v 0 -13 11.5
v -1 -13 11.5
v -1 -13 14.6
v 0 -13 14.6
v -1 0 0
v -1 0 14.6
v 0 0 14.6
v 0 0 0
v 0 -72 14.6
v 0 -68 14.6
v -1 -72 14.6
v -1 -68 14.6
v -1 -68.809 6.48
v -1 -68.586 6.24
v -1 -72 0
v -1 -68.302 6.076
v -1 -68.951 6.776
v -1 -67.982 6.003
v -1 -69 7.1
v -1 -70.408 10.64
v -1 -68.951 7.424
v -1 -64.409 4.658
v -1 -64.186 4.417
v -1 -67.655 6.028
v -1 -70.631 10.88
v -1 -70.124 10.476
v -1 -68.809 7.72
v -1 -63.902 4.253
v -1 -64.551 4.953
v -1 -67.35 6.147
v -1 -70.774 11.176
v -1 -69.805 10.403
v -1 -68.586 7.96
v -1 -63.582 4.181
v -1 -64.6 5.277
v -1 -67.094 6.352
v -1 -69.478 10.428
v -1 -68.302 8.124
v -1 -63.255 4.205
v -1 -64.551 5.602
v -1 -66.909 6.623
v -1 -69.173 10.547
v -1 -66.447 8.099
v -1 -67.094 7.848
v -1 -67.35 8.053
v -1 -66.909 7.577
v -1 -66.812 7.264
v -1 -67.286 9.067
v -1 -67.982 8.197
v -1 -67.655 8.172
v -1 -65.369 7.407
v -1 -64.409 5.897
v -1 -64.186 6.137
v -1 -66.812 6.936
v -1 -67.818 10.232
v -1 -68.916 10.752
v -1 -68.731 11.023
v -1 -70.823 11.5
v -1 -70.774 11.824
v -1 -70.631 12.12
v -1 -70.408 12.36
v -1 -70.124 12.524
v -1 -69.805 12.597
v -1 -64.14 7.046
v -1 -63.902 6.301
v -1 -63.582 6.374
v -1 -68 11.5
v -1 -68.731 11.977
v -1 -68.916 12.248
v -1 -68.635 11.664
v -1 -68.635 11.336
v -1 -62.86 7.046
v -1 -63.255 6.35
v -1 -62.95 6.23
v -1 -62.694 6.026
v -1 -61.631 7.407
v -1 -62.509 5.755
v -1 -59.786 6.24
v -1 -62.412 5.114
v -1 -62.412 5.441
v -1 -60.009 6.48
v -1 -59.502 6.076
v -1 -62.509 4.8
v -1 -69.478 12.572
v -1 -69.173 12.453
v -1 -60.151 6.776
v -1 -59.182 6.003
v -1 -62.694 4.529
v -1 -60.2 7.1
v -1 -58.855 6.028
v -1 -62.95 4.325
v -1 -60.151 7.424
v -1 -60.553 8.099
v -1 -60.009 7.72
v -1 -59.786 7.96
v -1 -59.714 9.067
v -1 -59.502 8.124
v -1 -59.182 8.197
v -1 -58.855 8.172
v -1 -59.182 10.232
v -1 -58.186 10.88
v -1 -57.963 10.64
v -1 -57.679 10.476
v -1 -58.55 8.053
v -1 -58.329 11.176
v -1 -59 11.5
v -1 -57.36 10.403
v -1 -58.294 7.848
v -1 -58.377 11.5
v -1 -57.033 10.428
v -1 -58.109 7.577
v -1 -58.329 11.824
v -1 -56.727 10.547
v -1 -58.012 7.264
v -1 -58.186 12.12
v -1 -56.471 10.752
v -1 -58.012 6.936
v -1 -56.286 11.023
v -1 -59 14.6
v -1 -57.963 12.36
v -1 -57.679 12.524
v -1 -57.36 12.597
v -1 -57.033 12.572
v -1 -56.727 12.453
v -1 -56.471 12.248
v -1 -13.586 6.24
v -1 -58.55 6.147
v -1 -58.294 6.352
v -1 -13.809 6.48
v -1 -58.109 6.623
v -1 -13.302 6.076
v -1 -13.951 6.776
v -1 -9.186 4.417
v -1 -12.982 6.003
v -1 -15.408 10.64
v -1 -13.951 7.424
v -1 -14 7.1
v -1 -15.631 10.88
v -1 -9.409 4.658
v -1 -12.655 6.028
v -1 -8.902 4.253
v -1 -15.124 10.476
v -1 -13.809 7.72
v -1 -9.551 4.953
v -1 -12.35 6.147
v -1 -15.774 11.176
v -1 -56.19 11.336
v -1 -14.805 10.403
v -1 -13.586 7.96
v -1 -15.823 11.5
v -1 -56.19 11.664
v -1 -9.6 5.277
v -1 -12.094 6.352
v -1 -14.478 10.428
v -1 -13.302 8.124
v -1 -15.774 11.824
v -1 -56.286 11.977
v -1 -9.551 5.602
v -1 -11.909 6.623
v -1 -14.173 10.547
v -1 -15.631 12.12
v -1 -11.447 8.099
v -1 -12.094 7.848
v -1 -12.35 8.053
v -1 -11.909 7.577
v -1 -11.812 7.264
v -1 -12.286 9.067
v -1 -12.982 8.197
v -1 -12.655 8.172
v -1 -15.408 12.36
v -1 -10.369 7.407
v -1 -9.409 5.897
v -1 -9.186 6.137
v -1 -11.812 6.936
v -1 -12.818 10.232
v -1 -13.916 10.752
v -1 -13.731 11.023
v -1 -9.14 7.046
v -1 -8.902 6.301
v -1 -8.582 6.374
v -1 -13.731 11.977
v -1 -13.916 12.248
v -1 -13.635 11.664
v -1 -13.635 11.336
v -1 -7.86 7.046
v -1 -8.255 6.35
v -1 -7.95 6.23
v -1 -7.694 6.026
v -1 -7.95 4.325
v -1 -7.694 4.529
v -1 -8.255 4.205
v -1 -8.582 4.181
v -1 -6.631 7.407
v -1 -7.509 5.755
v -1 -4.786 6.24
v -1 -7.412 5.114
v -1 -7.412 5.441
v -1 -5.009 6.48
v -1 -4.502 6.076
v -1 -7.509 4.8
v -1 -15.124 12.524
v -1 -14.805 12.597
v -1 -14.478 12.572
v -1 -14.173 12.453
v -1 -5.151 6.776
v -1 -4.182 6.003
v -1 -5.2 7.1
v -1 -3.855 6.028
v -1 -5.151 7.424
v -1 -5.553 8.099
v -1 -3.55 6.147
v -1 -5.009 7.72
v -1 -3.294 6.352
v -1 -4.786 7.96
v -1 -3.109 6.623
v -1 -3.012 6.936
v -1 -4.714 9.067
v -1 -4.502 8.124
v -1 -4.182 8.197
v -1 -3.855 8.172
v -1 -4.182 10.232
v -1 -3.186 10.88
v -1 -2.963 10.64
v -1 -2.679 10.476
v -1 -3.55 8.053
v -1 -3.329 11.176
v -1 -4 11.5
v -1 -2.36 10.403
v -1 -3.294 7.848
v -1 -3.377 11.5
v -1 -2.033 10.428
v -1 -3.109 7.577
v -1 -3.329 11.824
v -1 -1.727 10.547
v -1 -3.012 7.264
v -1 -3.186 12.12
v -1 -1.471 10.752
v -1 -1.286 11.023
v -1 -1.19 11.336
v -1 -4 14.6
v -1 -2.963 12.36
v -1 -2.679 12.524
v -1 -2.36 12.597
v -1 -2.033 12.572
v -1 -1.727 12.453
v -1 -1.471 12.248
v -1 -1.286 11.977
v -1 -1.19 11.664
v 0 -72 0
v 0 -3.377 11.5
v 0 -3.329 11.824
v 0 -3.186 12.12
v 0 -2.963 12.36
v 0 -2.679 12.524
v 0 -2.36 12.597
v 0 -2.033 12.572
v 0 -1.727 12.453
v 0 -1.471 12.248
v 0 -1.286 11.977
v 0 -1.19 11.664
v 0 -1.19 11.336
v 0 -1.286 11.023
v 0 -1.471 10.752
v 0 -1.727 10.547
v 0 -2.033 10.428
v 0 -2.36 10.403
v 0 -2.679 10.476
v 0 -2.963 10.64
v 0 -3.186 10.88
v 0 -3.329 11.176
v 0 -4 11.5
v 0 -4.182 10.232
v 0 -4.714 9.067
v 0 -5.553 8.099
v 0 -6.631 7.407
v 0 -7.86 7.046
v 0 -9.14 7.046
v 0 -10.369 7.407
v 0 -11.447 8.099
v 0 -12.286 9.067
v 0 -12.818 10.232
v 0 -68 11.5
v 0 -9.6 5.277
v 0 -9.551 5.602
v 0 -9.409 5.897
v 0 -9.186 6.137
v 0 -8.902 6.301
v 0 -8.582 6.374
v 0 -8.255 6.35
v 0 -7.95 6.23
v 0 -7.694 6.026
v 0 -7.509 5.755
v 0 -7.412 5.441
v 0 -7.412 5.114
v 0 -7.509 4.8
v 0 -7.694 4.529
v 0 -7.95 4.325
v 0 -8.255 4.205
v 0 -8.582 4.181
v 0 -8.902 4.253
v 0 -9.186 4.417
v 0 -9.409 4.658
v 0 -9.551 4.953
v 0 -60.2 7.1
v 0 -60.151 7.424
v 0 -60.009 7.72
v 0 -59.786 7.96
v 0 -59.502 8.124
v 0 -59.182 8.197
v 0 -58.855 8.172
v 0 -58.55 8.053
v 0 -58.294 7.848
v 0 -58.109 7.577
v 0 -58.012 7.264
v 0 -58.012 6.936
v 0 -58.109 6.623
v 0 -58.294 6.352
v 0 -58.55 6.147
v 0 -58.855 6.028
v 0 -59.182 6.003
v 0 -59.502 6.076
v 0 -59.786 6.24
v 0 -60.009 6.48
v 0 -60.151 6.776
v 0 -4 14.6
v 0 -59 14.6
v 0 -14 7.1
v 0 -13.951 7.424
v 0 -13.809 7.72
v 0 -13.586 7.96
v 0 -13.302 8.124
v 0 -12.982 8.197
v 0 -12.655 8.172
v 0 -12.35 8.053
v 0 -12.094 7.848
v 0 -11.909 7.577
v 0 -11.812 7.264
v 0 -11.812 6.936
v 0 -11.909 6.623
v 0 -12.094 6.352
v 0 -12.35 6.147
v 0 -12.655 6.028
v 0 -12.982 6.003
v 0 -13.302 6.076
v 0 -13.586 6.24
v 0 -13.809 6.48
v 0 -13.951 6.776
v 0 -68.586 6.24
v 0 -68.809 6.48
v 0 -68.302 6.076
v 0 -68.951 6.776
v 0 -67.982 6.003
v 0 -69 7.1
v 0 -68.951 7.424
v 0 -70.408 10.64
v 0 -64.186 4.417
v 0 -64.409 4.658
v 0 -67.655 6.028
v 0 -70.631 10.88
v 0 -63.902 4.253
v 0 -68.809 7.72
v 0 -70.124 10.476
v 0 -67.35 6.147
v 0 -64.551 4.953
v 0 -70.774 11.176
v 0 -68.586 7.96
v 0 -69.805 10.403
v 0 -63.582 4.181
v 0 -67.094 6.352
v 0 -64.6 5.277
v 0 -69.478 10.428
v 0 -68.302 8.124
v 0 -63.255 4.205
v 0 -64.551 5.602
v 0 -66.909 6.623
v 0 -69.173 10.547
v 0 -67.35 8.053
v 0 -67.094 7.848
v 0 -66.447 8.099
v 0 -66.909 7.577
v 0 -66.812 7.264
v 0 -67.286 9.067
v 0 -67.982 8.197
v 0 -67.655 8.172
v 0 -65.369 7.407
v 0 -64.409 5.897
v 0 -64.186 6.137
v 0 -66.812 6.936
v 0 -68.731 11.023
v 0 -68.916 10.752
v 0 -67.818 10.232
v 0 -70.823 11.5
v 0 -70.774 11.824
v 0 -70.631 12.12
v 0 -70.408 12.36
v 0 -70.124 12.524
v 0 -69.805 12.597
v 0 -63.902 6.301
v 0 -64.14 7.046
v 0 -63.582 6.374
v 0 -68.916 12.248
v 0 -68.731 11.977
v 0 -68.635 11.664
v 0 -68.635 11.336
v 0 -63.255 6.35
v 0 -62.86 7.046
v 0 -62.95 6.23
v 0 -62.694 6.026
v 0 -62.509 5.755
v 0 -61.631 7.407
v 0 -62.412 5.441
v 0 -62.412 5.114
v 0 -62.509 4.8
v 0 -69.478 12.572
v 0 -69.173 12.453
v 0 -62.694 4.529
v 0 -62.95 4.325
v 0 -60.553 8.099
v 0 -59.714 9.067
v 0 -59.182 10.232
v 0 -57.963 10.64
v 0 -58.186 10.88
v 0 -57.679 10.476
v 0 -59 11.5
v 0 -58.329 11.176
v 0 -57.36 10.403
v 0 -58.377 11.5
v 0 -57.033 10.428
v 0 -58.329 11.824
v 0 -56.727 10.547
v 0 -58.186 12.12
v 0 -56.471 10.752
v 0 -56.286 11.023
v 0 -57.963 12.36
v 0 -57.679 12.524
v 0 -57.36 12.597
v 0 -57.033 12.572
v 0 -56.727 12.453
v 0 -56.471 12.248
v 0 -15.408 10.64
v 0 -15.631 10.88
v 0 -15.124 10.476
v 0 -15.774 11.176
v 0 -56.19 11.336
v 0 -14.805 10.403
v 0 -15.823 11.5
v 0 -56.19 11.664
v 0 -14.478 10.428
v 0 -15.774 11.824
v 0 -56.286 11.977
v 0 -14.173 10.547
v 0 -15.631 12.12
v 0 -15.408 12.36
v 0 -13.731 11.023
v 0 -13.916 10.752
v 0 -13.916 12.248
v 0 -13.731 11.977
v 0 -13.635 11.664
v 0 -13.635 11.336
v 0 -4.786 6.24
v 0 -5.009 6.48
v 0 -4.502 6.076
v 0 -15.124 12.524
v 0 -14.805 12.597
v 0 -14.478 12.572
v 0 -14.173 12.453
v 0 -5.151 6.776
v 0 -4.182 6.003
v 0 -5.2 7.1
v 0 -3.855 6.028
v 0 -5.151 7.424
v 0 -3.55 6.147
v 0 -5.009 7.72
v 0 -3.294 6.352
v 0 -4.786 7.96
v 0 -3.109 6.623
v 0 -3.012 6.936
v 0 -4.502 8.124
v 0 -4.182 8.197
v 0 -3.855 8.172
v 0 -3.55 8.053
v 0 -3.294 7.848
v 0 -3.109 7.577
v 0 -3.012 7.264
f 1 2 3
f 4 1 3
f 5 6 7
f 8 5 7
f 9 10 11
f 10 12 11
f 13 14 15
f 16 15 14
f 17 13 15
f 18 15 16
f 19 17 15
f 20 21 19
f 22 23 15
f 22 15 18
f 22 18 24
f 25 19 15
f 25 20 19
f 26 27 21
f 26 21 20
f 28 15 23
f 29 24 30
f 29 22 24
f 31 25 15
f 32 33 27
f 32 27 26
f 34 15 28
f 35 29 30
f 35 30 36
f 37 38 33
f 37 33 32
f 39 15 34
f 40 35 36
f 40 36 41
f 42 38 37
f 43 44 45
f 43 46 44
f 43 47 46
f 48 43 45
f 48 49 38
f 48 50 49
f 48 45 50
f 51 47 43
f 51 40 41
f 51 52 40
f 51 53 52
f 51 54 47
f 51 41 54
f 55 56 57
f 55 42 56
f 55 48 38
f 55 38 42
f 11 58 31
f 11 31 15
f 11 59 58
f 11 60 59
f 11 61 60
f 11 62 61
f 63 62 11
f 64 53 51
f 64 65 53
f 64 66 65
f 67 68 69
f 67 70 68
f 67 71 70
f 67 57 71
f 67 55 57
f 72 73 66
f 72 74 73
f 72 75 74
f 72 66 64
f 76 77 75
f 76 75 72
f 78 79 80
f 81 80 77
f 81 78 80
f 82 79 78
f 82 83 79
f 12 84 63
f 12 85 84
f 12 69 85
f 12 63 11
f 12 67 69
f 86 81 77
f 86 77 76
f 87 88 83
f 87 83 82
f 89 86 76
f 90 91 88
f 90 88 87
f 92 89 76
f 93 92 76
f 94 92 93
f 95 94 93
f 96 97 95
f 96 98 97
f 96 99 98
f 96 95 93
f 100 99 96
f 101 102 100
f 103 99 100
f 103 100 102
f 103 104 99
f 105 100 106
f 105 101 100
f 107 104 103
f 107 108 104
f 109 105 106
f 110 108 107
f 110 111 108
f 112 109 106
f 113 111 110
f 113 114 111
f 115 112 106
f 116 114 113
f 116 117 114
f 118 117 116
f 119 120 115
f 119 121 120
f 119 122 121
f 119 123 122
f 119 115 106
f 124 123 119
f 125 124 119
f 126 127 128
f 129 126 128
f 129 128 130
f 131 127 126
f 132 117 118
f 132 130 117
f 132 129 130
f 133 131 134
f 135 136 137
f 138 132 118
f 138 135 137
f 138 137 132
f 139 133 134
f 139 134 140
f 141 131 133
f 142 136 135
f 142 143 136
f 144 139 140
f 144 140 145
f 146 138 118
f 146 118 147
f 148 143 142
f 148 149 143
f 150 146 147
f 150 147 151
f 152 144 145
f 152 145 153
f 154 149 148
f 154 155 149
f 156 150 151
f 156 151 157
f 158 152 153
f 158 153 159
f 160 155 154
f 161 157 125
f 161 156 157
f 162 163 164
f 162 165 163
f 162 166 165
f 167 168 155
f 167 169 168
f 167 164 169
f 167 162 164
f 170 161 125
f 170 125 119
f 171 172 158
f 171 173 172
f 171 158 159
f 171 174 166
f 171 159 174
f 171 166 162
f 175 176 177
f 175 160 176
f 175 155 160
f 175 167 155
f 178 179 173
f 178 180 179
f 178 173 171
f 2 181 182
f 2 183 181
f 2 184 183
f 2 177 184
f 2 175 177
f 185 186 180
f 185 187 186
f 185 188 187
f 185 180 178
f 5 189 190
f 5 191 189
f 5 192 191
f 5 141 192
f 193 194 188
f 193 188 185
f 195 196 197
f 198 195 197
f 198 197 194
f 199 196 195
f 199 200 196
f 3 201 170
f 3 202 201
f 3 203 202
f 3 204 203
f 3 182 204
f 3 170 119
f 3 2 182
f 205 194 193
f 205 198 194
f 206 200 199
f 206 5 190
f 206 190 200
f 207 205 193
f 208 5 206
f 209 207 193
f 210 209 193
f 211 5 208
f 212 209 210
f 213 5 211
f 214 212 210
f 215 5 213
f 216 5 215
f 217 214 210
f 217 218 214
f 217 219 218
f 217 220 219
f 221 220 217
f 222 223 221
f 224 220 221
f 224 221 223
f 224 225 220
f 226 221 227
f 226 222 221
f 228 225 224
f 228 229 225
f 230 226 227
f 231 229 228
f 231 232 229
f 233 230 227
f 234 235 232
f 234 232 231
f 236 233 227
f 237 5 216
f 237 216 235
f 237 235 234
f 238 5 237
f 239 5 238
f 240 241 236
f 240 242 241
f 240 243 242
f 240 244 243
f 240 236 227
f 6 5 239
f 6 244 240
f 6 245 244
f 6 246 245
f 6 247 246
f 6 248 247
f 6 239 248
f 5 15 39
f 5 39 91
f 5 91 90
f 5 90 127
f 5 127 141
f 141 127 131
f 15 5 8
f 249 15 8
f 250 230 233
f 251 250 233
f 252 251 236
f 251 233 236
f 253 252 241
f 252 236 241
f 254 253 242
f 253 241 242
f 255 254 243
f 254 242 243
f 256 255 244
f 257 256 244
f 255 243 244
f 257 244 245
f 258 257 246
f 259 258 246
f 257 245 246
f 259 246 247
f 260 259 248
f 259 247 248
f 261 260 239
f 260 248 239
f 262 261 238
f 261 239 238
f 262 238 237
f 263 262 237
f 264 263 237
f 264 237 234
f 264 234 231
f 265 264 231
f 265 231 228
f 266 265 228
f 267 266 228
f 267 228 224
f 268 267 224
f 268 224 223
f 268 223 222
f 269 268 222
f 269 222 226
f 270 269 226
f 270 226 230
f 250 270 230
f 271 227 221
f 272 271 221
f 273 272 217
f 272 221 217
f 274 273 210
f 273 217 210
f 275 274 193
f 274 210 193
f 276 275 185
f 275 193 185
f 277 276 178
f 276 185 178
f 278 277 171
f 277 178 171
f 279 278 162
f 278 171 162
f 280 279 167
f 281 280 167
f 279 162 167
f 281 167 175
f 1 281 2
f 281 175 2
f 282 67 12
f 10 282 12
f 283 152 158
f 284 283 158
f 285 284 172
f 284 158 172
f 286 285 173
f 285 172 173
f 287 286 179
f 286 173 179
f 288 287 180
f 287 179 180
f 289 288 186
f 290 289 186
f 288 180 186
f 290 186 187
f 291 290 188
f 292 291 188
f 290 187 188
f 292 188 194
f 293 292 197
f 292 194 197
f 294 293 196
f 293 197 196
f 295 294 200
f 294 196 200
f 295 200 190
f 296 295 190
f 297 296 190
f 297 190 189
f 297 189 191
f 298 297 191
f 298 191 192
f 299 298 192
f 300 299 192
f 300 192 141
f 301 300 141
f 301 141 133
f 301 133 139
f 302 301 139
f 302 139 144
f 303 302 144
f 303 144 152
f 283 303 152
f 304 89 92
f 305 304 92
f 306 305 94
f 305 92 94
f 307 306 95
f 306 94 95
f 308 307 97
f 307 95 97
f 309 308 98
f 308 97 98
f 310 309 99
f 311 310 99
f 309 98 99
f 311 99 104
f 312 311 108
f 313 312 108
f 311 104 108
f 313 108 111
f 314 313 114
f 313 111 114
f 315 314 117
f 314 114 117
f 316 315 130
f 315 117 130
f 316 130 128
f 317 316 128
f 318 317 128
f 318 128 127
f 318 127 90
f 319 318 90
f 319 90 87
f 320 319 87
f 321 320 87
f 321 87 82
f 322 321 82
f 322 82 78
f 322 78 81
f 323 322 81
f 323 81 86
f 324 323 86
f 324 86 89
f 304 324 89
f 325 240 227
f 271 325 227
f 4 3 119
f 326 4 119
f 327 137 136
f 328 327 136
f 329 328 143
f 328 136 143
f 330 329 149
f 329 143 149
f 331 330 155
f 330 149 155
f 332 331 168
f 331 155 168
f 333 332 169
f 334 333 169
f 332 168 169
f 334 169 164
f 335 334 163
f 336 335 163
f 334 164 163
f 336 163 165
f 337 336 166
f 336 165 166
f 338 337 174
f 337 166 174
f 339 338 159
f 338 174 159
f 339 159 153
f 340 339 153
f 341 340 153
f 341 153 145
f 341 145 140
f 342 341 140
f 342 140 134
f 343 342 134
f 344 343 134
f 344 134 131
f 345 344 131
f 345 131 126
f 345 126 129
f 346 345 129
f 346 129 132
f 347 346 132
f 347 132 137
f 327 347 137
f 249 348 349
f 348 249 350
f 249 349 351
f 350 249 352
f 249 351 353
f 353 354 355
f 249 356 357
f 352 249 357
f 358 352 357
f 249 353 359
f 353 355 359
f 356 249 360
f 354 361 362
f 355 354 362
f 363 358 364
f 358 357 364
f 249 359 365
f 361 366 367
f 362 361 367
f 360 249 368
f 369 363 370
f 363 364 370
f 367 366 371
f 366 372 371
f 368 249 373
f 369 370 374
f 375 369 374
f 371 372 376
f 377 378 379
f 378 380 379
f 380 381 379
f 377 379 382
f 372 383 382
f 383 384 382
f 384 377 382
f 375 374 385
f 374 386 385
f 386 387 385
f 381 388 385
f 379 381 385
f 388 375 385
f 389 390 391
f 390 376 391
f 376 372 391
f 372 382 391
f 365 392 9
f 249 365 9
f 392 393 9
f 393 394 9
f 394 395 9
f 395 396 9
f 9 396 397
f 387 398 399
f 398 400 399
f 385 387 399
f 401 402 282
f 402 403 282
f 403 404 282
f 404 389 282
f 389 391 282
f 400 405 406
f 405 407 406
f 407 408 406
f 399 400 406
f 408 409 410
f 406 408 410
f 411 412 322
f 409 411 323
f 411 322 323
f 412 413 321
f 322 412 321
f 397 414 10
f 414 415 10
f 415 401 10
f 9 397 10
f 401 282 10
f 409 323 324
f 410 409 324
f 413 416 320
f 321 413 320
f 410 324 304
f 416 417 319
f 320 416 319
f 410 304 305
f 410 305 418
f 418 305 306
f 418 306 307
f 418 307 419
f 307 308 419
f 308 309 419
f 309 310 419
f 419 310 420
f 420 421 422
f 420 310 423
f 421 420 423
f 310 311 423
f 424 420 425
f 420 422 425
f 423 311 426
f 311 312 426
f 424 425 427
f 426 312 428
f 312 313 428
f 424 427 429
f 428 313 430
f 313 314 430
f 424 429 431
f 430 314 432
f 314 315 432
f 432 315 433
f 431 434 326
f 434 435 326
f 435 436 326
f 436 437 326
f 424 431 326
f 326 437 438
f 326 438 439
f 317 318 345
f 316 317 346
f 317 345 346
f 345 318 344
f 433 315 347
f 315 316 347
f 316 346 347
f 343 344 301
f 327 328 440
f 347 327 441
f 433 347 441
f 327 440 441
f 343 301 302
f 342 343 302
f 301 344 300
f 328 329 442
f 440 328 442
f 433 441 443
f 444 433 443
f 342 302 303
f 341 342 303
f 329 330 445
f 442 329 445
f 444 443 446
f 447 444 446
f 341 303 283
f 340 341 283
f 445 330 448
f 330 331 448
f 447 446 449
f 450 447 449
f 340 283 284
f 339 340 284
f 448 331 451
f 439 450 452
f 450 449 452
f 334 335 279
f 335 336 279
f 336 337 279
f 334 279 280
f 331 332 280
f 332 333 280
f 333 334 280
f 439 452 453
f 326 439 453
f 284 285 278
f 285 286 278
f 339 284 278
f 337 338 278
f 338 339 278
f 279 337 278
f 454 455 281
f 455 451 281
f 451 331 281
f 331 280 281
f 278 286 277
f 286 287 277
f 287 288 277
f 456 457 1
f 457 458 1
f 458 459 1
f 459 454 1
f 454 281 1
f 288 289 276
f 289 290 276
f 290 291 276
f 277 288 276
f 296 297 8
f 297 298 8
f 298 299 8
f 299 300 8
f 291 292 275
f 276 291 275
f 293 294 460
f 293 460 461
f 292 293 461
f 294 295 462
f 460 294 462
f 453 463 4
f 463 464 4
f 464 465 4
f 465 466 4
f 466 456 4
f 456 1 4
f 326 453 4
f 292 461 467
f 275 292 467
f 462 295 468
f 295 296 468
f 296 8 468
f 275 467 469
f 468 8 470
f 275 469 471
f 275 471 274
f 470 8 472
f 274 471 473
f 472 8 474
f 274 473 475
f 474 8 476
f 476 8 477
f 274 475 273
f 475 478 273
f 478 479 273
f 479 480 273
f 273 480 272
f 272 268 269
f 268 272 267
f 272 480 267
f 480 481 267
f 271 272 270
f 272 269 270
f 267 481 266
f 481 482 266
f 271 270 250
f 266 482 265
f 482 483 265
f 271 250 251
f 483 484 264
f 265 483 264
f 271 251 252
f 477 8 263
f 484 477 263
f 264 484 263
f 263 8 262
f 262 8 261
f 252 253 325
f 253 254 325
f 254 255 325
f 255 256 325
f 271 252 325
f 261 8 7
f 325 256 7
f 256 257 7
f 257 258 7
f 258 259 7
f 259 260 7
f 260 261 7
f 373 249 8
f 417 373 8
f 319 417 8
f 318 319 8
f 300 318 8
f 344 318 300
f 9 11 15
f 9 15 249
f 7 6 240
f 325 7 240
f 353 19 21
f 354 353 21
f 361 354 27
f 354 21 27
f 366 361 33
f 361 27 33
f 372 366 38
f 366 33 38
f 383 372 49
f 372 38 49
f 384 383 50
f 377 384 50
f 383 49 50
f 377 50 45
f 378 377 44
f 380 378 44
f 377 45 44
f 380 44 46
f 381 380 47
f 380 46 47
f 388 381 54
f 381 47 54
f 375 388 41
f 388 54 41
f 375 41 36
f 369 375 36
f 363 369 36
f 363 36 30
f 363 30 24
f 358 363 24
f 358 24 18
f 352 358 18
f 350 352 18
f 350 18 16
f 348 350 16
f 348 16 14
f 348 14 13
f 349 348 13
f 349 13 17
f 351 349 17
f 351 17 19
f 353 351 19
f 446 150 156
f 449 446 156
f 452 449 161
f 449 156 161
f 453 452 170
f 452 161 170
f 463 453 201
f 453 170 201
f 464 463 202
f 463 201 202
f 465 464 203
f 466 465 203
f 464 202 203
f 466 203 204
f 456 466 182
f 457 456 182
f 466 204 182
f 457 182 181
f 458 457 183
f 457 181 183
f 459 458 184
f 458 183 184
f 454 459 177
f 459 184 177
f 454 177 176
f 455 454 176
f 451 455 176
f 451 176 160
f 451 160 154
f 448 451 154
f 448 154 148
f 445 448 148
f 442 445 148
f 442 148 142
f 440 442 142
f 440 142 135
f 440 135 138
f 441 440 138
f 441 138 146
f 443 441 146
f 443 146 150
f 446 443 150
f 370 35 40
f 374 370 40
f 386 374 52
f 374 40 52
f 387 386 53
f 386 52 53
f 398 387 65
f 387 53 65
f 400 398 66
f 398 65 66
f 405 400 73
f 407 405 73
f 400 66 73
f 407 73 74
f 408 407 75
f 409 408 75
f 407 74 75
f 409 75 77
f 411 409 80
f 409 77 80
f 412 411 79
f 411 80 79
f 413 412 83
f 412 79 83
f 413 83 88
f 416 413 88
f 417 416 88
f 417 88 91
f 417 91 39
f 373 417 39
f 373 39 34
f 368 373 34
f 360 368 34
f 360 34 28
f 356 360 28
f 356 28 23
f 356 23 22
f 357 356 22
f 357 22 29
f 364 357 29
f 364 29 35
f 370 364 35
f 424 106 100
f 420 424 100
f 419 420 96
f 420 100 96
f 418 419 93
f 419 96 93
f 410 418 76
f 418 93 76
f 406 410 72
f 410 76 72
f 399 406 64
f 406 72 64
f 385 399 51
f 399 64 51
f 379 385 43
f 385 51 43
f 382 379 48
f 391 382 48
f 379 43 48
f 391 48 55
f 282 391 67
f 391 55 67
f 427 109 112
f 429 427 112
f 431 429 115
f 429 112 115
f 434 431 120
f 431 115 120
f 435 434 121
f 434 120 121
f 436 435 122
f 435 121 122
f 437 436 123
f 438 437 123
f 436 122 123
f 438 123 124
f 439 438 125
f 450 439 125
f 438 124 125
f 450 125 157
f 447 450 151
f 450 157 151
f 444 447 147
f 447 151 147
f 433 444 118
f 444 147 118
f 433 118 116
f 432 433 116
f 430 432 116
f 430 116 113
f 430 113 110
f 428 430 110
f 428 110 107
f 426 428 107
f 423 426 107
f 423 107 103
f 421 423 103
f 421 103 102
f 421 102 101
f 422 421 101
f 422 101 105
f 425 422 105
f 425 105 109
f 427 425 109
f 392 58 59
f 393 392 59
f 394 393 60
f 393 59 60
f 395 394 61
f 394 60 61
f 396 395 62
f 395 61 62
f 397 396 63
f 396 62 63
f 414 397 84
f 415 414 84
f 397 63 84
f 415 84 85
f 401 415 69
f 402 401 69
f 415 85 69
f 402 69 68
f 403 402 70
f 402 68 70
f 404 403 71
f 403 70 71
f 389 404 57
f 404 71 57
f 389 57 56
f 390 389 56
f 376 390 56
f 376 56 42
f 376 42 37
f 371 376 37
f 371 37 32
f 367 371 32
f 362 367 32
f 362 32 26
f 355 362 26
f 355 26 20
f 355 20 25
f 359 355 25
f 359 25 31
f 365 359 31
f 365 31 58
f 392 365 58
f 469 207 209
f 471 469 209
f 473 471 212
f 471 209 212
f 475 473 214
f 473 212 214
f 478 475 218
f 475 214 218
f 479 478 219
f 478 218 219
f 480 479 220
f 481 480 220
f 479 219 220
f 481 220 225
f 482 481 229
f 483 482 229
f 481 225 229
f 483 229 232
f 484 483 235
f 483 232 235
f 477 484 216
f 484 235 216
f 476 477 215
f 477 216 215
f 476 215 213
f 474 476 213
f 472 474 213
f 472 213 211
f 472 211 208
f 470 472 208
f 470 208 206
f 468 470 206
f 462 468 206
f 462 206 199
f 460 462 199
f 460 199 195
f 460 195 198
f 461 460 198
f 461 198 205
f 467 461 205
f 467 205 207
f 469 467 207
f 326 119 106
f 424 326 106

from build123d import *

# Parameters (mm, degrees)
F0_W     = 1
F0_H     = 20
F1_DEPTH = 72
F2_R     = 1.1
F3_DEPTH = 1.001
F4_W     = 72
F4_H     = 5.4
F5_DEPTH = 1.001


with BuildPart() as f1:
    # F0 (on Front) → F1 (new body)
    with BuildSketch(Plane.XZ):
        with Locations((-0.5, 10)):
            Rectangle(F0_W, F0_H)
    extrude(amount=F1_DEPTH)

    # F2 (on face) → F3 (cut, through all)
    with BuildSketch(Plane(origin=(-1, 0, 0), x_dir=(0, -1, 0), z_dir=(-1, 0, 0))):
        with BuildLine():
            Line((4, 20), (4, 11.5))
            ThreePointArc((4, 11.5), (8.5, 7), (13, 11.5))
            Line((13, 11.5), (13, 20))
            Line((13, 20), (4, 20))
        make_face()
        with Locations((2.27746, 11.5)):
            Circle(F2_R)
        with Locations((4.1, 7.1)):
            Circle(F2_R)
        with Locations((8.5, 5.27746)):
            Circle(F2_R)
        with Locations((12.9, 7.1)):
            Circle(F2_R)
        with Locations((14.72254, 11.5)):
            Circle(F2_R)
        with BuildLine():
            ThreePointArc((59, 11.5), (63.5, 7), (68, 11.5))
            Line((68, 11.5), (68, 20))
            Line((68, 20), (59, 20))
            Line((59, 20), (59, 11.5))
        make_face()
        with Locations((69.72254, 11.5)):
            Circle(F2_R)
        with Locations((67.9, 7.1)):
            Circle(F2_R)
        with Locations((63.5, 5.27746)):
            Circle(F2_R)
        with Locations((59.1, 7.1)):
            Circle(F2_R)
        with Locations((57.27746, 11.5)):
            Circle(F2_R)
    extrude(amount=-F3_DEPTH, mode=Mode.SUBTRACT)

    # F4 (on face) → F5 (cut, through all)
    with BuildSketch(Plane(origin=(-1, 0, 0), x_dir=(0, -1, 0), z_dir=(-1, 0, 0))):
        with Locations((36, 17.3)):
            Rectangle(F4_W, F4_H)
    extrude(amount=-F5_DEPTH, mode=Mode.SUBTRACT)


solid = f1.part
